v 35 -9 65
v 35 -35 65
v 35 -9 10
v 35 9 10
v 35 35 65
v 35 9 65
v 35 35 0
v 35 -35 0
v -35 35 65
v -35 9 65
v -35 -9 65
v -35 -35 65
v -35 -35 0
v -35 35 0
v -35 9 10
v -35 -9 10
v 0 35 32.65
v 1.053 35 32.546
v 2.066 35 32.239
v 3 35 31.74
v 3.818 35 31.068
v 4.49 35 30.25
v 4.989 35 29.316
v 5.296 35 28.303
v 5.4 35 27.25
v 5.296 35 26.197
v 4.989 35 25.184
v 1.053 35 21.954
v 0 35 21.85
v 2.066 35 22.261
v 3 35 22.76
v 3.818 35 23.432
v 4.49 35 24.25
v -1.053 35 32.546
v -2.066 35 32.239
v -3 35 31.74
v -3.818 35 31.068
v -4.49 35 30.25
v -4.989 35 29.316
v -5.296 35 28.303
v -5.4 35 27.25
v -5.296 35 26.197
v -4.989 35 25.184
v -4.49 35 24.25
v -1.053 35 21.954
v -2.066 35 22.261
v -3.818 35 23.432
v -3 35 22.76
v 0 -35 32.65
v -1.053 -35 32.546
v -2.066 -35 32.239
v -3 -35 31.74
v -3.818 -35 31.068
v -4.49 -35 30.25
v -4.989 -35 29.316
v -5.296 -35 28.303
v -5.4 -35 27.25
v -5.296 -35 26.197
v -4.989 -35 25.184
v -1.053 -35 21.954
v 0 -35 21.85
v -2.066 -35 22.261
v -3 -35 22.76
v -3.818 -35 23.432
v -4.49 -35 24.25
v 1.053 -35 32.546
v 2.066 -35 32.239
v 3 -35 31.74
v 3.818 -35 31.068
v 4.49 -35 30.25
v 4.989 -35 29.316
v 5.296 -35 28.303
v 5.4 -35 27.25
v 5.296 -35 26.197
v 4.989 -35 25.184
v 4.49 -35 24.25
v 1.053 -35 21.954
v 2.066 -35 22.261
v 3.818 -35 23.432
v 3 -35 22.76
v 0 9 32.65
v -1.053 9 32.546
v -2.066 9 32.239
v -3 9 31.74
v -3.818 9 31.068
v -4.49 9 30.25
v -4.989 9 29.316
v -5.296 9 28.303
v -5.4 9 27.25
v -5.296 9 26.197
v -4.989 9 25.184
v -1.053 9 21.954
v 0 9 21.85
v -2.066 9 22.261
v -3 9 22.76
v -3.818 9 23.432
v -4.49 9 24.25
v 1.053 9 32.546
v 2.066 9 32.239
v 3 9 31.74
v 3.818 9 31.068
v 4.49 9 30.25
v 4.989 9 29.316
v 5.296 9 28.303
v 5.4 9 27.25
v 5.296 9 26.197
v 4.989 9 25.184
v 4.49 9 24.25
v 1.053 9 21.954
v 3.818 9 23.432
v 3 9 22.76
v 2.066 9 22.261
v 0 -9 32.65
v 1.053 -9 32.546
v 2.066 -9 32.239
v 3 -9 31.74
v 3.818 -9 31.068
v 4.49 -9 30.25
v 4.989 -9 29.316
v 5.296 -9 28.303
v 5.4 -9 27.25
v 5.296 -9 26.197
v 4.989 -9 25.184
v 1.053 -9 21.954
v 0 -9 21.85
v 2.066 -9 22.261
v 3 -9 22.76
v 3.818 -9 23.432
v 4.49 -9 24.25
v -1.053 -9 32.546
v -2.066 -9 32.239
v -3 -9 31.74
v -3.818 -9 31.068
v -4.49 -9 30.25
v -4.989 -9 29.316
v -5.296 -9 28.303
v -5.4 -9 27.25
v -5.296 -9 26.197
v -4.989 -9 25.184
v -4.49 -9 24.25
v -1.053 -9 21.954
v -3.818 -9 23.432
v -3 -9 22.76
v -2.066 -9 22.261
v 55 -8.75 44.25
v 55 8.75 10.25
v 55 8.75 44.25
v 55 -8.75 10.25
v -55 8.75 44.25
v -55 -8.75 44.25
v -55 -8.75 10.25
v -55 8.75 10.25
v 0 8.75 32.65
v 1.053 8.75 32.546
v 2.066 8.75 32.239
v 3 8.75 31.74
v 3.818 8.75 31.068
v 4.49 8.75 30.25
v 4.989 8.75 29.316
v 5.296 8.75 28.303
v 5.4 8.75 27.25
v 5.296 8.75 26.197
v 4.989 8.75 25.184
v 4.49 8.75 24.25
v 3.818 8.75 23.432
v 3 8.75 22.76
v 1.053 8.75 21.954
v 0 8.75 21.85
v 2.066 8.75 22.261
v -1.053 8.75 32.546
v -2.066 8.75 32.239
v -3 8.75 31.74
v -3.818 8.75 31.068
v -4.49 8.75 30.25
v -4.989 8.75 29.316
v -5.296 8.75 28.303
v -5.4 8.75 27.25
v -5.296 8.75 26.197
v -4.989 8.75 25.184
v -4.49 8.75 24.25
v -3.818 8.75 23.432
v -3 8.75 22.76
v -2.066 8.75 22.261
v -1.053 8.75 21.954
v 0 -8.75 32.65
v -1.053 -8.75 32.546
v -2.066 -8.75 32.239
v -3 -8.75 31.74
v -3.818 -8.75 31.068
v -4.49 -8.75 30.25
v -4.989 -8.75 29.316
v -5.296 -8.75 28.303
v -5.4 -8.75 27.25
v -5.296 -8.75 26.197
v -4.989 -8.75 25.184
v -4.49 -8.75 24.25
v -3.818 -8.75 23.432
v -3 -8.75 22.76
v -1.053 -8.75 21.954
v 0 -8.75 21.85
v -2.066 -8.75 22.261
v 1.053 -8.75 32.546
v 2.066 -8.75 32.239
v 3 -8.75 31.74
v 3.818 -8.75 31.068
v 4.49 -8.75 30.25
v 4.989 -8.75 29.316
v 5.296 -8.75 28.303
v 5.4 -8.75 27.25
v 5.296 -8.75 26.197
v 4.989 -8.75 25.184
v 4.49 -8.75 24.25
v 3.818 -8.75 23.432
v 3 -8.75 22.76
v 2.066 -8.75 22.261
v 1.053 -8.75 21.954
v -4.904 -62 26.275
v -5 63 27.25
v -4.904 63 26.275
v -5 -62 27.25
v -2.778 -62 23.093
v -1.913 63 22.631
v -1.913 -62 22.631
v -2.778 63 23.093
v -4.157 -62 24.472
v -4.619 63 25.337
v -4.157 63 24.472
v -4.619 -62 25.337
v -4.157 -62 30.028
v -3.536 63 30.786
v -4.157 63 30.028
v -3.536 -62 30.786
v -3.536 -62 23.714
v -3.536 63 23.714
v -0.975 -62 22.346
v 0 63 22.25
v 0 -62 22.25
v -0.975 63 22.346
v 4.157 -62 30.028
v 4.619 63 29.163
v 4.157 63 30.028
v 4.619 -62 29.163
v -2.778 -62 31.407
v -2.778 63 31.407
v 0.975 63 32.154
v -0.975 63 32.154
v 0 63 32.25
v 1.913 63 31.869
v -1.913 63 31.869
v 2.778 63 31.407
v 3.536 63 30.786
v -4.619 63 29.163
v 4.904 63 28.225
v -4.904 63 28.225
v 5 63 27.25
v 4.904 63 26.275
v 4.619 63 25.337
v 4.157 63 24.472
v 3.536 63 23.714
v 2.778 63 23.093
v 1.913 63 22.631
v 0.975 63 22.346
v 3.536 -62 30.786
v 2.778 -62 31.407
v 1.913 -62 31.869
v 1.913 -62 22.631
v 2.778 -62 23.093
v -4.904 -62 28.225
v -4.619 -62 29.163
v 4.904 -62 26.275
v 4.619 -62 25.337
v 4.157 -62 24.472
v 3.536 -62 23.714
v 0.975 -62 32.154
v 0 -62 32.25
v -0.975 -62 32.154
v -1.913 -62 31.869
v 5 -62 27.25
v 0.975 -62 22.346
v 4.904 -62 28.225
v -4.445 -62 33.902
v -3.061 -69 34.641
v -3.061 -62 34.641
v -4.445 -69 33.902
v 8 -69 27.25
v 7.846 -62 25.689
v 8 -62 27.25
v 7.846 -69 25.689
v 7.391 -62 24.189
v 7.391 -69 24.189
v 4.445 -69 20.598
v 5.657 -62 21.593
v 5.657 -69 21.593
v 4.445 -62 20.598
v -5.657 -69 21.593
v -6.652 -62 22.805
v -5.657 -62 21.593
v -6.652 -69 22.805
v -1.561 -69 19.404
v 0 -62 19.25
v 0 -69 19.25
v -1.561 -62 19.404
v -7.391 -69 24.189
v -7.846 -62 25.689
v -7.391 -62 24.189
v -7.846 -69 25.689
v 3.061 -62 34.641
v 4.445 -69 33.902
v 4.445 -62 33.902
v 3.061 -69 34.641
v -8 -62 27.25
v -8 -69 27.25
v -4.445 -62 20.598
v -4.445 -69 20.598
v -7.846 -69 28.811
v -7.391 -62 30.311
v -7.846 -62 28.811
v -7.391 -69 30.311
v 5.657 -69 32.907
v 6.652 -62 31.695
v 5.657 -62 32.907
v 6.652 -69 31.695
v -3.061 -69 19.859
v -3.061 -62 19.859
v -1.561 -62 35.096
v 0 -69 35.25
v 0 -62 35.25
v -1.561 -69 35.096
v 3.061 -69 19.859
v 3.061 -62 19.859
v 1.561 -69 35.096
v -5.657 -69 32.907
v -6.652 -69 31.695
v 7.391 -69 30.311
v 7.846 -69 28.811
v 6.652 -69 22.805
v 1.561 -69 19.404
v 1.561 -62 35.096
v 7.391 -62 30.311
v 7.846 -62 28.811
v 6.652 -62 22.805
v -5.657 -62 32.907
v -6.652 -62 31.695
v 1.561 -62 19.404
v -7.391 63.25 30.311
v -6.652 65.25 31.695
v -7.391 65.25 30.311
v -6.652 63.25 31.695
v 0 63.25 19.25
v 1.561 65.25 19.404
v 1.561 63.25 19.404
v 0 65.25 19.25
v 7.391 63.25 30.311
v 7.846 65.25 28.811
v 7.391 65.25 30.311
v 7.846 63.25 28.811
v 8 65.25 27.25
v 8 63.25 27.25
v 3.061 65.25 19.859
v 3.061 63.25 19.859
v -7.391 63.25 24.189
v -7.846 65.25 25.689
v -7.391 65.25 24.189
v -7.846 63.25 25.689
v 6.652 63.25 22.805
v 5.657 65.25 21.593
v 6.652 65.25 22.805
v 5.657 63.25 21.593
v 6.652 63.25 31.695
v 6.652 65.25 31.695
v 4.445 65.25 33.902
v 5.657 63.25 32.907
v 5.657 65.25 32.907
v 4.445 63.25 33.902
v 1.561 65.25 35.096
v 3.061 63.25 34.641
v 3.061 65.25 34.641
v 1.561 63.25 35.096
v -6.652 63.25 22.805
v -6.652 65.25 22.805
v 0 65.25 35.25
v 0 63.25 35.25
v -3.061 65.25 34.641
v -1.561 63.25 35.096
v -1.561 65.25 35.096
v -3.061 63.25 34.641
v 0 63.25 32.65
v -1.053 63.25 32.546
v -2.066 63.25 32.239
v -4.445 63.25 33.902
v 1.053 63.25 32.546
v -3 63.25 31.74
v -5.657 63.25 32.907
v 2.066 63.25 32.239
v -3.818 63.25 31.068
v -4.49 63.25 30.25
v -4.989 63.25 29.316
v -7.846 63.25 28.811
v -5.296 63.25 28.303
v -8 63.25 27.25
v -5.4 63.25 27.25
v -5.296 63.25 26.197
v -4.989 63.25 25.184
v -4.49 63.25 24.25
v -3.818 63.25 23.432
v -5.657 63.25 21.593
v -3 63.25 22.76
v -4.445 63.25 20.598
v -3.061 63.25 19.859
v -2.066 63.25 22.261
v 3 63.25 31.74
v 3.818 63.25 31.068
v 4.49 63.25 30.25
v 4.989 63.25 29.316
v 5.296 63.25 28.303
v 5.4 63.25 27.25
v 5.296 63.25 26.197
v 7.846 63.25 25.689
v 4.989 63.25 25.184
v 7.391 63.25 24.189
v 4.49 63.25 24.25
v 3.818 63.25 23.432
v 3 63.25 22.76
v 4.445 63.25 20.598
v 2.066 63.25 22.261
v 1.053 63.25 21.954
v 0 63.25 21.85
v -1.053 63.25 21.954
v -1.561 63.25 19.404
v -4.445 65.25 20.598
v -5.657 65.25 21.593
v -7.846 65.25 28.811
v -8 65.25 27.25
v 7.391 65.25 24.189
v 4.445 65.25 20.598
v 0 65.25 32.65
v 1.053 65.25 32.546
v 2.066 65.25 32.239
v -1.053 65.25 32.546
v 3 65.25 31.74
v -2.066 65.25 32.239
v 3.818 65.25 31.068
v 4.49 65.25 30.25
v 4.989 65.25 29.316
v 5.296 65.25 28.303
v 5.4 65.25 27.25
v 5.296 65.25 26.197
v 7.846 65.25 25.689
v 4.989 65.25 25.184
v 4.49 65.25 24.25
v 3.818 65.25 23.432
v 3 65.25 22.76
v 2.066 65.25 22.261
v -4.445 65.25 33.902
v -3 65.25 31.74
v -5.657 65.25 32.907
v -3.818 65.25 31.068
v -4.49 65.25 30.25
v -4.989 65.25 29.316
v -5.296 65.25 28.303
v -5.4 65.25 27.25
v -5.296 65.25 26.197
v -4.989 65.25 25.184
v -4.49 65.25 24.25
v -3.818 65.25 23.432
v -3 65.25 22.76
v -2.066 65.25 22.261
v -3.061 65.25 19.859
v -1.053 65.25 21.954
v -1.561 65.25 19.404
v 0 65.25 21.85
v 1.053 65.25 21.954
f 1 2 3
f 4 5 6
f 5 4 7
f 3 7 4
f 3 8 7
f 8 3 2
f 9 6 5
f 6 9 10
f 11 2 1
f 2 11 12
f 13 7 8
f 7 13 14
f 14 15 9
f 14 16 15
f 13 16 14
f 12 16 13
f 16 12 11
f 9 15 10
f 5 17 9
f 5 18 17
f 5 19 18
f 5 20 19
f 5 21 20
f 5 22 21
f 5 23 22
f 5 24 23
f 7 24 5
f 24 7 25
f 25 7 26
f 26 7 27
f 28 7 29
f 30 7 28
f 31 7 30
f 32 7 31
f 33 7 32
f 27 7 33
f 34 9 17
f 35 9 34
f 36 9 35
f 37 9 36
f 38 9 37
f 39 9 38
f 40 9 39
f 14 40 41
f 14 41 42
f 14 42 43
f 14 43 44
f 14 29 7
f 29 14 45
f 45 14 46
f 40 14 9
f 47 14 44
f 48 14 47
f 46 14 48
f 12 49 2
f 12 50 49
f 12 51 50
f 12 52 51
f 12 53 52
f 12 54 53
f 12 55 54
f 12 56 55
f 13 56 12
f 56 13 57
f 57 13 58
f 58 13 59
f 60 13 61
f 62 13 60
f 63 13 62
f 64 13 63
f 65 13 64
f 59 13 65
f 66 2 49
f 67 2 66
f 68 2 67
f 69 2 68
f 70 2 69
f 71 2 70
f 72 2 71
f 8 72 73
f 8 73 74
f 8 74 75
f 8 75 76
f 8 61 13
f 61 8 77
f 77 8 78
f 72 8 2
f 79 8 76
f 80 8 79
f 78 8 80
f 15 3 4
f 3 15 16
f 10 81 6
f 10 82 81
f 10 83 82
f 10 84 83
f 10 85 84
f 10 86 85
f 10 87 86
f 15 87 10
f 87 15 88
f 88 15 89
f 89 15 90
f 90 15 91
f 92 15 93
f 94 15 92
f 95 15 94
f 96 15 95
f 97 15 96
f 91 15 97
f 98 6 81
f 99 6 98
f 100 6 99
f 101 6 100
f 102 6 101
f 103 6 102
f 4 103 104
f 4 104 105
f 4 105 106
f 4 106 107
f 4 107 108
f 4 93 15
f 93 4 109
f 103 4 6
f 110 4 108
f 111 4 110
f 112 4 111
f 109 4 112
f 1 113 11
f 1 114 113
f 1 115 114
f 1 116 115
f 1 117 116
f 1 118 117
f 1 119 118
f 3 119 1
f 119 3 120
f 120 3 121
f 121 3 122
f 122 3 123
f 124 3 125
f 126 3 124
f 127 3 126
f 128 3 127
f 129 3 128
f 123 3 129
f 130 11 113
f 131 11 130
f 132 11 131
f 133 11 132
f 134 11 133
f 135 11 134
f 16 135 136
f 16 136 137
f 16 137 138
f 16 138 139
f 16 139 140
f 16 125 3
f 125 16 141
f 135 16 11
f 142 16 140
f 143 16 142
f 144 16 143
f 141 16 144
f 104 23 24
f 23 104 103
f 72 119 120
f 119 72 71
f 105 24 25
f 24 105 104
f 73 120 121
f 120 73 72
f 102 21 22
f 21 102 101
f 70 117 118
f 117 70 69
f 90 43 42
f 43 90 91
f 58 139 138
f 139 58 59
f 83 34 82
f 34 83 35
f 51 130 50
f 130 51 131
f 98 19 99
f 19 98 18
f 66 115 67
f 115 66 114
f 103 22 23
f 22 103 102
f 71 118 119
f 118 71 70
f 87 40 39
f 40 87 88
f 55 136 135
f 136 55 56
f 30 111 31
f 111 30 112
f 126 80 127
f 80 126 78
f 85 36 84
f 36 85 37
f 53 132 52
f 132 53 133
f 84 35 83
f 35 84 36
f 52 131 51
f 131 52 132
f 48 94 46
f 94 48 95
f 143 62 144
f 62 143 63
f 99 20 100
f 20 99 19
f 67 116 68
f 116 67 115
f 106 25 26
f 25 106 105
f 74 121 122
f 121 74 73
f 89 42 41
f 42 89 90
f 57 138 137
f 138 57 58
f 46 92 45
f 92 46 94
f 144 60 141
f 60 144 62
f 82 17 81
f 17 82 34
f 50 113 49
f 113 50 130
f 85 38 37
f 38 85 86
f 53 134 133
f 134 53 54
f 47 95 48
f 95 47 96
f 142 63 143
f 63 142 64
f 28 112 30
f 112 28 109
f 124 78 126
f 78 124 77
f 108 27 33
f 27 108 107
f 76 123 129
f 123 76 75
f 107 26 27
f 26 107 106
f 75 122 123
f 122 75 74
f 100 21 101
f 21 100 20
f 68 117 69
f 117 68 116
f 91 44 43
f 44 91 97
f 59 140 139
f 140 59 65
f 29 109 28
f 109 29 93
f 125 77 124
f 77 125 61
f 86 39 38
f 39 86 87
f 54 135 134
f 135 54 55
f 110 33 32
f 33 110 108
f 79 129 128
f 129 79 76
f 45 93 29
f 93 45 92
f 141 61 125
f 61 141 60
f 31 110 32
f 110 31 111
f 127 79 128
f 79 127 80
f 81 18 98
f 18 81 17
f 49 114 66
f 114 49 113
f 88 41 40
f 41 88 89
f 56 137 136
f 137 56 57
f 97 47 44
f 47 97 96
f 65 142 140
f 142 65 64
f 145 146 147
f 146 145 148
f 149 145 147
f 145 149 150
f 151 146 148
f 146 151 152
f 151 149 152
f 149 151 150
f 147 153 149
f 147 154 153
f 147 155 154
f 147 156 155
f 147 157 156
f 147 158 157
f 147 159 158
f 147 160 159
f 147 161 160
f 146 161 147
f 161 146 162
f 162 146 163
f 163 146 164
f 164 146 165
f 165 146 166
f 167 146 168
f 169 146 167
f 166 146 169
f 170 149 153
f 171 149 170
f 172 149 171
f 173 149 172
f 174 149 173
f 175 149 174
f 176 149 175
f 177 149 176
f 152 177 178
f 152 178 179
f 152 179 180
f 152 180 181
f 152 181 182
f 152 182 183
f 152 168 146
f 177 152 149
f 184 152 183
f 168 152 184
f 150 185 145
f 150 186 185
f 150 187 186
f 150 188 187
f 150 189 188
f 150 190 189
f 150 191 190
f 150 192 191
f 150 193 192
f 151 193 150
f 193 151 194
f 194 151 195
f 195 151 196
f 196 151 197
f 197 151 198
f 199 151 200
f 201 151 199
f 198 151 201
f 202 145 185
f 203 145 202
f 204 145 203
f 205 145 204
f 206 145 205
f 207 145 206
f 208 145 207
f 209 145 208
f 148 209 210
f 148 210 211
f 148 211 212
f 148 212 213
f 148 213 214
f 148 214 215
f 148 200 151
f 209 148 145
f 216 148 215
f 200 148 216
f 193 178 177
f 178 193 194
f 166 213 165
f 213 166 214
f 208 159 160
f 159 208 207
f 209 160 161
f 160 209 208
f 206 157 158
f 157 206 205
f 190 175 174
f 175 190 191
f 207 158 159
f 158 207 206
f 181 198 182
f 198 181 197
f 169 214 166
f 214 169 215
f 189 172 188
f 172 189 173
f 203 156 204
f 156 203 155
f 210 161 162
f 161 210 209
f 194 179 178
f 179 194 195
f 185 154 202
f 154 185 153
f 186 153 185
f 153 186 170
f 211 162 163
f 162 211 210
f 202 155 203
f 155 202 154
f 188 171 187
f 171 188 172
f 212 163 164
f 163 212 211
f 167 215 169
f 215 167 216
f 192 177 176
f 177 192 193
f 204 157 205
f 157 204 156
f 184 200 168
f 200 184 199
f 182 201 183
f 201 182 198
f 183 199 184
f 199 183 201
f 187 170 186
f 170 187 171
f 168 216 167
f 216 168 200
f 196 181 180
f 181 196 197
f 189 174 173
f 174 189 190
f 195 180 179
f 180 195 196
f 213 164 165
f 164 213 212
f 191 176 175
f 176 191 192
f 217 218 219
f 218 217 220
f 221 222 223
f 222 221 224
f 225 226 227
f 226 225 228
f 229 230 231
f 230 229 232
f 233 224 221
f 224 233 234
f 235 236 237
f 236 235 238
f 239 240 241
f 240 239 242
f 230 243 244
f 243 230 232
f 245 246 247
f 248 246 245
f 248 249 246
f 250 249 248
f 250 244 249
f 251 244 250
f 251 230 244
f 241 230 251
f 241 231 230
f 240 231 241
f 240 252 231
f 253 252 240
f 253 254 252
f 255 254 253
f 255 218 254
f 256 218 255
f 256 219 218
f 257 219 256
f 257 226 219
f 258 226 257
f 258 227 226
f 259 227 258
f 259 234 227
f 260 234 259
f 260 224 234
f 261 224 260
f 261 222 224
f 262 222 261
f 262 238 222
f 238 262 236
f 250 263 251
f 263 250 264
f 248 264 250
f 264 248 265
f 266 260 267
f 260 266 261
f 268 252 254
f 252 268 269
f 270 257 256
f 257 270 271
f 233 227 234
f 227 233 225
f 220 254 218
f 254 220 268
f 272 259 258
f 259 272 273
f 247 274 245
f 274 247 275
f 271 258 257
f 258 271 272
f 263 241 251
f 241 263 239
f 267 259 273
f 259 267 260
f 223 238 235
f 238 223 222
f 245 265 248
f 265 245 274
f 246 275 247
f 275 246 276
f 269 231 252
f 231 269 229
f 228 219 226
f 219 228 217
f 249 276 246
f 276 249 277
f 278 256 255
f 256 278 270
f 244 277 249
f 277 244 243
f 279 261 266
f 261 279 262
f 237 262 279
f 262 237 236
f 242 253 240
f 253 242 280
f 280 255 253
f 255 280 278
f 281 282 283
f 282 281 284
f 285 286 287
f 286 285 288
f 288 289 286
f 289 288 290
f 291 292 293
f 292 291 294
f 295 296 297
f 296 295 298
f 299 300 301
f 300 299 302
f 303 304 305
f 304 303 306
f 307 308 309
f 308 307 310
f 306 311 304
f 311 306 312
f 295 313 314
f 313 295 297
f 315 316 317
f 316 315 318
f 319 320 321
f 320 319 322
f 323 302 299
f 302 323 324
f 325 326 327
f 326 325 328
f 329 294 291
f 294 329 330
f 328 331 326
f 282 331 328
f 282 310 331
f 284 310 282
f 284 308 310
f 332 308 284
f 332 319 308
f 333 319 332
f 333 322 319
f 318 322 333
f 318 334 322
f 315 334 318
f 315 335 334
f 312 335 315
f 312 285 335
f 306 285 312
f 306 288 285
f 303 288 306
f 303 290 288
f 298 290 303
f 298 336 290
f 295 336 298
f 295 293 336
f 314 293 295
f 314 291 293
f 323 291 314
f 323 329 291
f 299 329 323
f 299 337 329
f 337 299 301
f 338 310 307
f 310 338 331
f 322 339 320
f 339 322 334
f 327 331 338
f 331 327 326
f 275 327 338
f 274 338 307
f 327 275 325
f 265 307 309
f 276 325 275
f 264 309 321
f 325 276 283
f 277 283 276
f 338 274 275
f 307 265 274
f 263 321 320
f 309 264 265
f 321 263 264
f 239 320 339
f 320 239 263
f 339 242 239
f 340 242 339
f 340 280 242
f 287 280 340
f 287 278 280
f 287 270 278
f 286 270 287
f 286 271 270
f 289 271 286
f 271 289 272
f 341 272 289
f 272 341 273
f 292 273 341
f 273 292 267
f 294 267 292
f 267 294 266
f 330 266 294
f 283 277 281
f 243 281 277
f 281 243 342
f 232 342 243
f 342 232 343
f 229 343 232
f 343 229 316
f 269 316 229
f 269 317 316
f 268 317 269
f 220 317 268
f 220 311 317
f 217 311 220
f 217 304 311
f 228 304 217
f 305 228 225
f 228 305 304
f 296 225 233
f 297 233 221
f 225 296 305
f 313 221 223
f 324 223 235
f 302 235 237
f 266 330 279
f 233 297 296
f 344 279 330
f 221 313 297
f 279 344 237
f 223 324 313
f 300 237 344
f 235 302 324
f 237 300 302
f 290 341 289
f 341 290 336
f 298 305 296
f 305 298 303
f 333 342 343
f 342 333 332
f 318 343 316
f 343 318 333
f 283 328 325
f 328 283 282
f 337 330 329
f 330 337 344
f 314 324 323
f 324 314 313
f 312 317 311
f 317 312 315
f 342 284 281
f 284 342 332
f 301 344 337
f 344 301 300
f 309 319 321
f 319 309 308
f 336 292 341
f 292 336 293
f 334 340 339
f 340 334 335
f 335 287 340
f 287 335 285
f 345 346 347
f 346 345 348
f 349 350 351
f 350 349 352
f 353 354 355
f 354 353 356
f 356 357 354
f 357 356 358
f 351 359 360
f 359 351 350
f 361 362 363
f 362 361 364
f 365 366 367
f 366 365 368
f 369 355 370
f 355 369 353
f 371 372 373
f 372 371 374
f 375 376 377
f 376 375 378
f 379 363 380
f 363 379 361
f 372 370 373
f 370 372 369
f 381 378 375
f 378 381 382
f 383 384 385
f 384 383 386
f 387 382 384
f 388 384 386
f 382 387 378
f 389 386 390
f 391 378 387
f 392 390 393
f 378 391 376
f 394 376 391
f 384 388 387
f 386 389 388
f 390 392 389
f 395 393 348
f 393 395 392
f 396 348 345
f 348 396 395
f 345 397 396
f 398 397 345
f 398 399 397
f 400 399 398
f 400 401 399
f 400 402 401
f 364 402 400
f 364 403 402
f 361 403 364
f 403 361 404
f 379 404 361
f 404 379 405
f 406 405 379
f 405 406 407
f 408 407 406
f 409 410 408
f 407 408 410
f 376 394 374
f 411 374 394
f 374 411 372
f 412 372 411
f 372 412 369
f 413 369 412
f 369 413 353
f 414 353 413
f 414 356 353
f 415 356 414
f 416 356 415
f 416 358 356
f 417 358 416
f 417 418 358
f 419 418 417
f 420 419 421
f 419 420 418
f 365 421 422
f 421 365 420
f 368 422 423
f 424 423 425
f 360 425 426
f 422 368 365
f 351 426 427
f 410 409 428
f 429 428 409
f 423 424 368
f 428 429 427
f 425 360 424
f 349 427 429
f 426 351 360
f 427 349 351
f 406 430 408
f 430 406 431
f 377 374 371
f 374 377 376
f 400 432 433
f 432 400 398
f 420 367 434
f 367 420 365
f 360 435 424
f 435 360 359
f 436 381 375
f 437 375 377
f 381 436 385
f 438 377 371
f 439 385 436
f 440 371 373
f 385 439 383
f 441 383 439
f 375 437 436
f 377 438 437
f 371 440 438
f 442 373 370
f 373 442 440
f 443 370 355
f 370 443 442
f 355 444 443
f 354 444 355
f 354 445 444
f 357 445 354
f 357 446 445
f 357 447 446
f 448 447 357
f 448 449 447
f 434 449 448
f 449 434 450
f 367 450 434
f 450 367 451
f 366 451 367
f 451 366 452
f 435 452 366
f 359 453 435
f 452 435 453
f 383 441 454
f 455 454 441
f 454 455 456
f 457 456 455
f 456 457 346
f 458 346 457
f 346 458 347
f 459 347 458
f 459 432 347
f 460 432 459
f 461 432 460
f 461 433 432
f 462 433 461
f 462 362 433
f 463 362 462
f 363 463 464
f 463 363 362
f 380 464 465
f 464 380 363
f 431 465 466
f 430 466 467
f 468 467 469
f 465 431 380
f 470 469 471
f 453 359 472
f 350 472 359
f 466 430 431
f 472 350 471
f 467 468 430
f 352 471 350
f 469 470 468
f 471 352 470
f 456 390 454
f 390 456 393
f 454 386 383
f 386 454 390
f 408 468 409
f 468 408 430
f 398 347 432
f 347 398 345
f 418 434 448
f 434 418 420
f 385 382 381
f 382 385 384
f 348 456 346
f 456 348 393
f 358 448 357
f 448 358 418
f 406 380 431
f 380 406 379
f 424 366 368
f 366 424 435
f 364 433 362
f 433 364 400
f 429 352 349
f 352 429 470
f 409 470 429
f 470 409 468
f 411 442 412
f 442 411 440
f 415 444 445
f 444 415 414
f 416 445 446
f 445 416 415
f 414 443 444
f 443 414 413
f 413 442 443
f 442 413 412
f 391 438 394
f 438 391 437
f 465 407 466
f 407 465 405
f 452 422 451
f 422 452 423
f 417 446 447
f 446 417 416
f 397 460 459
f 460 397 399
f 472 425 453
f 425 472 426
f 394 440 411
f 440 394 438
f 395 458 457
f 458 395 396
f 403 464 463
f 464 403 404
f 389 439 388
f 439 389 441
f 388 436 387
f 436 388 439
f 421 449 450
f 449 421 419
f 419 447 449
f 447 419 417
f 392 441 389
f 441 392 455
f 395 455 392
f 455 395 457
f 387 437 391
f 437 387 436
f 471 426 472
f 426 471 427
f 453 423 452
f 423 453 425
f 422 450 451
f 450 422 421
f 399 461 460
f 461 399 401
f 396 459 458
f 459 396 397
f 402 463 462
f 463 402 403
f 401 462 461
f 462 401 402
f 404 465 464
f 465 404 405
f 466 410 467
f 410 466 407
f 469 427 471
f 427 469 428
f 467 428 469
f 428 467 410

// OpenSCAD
$fn = 32;

// ------------------------------------------------------------------------
// Clevis joint: 70 mm clevis, pin d10
// Every part is its own module, assembly() places them once.
// ------------------------------------------------------------------------

// --- part 1 ---
module clevis() {
  difference() {
    translate([-35, -35, 0]) cube([70, 70, 65]);
    translate([-36, -9, 10]) cube([72, 18, 56]);
    translate([0, 0, 27.25]) rotate([90, 0, 0]) cylinder(h = 72, d = 10.8, center = true);
  }
}

// --- part 2 ---
module eye() {
  difference() {
    translate([-55, -8.75, 0]) cube([110, 17.5, 34]);
    translate([0, 0, 17]) rotate([90, 0, 0]) cylinder(h = 19.5, d = 10.8, center = true);
  }
}

// --- part 3 ---
module pin() {
  rotate([0, 90, 0]) cylinder(h = 126, d = 10, center = true);
  translate([-69, 0, 0]) rotate([0, 90, 0]) cylinder(h = 7, d = 16);
}

// --- part 4 ---
module retainer() {
  difference() {
      translate([0, 0, 0]) cylinder(h = 2, d = 16);
      translate([0, 0, -1]) cylinder(h = 4, d = 10.8);
    }
}

// --- assembly ---
module assembly() {
  translate([0, 0, 0]) rotate([0, 0, 0]) clevis();
  translate([0, 0, 10.25]) rotate([0, 0, 0]) eye();
  translate([0, 0, 27.25]) rotate([0, 0, 90]) pin();
  translate([0, 65.25, 27.25]) rotate([90, 0, 0]) retainer();
}

assembly();
